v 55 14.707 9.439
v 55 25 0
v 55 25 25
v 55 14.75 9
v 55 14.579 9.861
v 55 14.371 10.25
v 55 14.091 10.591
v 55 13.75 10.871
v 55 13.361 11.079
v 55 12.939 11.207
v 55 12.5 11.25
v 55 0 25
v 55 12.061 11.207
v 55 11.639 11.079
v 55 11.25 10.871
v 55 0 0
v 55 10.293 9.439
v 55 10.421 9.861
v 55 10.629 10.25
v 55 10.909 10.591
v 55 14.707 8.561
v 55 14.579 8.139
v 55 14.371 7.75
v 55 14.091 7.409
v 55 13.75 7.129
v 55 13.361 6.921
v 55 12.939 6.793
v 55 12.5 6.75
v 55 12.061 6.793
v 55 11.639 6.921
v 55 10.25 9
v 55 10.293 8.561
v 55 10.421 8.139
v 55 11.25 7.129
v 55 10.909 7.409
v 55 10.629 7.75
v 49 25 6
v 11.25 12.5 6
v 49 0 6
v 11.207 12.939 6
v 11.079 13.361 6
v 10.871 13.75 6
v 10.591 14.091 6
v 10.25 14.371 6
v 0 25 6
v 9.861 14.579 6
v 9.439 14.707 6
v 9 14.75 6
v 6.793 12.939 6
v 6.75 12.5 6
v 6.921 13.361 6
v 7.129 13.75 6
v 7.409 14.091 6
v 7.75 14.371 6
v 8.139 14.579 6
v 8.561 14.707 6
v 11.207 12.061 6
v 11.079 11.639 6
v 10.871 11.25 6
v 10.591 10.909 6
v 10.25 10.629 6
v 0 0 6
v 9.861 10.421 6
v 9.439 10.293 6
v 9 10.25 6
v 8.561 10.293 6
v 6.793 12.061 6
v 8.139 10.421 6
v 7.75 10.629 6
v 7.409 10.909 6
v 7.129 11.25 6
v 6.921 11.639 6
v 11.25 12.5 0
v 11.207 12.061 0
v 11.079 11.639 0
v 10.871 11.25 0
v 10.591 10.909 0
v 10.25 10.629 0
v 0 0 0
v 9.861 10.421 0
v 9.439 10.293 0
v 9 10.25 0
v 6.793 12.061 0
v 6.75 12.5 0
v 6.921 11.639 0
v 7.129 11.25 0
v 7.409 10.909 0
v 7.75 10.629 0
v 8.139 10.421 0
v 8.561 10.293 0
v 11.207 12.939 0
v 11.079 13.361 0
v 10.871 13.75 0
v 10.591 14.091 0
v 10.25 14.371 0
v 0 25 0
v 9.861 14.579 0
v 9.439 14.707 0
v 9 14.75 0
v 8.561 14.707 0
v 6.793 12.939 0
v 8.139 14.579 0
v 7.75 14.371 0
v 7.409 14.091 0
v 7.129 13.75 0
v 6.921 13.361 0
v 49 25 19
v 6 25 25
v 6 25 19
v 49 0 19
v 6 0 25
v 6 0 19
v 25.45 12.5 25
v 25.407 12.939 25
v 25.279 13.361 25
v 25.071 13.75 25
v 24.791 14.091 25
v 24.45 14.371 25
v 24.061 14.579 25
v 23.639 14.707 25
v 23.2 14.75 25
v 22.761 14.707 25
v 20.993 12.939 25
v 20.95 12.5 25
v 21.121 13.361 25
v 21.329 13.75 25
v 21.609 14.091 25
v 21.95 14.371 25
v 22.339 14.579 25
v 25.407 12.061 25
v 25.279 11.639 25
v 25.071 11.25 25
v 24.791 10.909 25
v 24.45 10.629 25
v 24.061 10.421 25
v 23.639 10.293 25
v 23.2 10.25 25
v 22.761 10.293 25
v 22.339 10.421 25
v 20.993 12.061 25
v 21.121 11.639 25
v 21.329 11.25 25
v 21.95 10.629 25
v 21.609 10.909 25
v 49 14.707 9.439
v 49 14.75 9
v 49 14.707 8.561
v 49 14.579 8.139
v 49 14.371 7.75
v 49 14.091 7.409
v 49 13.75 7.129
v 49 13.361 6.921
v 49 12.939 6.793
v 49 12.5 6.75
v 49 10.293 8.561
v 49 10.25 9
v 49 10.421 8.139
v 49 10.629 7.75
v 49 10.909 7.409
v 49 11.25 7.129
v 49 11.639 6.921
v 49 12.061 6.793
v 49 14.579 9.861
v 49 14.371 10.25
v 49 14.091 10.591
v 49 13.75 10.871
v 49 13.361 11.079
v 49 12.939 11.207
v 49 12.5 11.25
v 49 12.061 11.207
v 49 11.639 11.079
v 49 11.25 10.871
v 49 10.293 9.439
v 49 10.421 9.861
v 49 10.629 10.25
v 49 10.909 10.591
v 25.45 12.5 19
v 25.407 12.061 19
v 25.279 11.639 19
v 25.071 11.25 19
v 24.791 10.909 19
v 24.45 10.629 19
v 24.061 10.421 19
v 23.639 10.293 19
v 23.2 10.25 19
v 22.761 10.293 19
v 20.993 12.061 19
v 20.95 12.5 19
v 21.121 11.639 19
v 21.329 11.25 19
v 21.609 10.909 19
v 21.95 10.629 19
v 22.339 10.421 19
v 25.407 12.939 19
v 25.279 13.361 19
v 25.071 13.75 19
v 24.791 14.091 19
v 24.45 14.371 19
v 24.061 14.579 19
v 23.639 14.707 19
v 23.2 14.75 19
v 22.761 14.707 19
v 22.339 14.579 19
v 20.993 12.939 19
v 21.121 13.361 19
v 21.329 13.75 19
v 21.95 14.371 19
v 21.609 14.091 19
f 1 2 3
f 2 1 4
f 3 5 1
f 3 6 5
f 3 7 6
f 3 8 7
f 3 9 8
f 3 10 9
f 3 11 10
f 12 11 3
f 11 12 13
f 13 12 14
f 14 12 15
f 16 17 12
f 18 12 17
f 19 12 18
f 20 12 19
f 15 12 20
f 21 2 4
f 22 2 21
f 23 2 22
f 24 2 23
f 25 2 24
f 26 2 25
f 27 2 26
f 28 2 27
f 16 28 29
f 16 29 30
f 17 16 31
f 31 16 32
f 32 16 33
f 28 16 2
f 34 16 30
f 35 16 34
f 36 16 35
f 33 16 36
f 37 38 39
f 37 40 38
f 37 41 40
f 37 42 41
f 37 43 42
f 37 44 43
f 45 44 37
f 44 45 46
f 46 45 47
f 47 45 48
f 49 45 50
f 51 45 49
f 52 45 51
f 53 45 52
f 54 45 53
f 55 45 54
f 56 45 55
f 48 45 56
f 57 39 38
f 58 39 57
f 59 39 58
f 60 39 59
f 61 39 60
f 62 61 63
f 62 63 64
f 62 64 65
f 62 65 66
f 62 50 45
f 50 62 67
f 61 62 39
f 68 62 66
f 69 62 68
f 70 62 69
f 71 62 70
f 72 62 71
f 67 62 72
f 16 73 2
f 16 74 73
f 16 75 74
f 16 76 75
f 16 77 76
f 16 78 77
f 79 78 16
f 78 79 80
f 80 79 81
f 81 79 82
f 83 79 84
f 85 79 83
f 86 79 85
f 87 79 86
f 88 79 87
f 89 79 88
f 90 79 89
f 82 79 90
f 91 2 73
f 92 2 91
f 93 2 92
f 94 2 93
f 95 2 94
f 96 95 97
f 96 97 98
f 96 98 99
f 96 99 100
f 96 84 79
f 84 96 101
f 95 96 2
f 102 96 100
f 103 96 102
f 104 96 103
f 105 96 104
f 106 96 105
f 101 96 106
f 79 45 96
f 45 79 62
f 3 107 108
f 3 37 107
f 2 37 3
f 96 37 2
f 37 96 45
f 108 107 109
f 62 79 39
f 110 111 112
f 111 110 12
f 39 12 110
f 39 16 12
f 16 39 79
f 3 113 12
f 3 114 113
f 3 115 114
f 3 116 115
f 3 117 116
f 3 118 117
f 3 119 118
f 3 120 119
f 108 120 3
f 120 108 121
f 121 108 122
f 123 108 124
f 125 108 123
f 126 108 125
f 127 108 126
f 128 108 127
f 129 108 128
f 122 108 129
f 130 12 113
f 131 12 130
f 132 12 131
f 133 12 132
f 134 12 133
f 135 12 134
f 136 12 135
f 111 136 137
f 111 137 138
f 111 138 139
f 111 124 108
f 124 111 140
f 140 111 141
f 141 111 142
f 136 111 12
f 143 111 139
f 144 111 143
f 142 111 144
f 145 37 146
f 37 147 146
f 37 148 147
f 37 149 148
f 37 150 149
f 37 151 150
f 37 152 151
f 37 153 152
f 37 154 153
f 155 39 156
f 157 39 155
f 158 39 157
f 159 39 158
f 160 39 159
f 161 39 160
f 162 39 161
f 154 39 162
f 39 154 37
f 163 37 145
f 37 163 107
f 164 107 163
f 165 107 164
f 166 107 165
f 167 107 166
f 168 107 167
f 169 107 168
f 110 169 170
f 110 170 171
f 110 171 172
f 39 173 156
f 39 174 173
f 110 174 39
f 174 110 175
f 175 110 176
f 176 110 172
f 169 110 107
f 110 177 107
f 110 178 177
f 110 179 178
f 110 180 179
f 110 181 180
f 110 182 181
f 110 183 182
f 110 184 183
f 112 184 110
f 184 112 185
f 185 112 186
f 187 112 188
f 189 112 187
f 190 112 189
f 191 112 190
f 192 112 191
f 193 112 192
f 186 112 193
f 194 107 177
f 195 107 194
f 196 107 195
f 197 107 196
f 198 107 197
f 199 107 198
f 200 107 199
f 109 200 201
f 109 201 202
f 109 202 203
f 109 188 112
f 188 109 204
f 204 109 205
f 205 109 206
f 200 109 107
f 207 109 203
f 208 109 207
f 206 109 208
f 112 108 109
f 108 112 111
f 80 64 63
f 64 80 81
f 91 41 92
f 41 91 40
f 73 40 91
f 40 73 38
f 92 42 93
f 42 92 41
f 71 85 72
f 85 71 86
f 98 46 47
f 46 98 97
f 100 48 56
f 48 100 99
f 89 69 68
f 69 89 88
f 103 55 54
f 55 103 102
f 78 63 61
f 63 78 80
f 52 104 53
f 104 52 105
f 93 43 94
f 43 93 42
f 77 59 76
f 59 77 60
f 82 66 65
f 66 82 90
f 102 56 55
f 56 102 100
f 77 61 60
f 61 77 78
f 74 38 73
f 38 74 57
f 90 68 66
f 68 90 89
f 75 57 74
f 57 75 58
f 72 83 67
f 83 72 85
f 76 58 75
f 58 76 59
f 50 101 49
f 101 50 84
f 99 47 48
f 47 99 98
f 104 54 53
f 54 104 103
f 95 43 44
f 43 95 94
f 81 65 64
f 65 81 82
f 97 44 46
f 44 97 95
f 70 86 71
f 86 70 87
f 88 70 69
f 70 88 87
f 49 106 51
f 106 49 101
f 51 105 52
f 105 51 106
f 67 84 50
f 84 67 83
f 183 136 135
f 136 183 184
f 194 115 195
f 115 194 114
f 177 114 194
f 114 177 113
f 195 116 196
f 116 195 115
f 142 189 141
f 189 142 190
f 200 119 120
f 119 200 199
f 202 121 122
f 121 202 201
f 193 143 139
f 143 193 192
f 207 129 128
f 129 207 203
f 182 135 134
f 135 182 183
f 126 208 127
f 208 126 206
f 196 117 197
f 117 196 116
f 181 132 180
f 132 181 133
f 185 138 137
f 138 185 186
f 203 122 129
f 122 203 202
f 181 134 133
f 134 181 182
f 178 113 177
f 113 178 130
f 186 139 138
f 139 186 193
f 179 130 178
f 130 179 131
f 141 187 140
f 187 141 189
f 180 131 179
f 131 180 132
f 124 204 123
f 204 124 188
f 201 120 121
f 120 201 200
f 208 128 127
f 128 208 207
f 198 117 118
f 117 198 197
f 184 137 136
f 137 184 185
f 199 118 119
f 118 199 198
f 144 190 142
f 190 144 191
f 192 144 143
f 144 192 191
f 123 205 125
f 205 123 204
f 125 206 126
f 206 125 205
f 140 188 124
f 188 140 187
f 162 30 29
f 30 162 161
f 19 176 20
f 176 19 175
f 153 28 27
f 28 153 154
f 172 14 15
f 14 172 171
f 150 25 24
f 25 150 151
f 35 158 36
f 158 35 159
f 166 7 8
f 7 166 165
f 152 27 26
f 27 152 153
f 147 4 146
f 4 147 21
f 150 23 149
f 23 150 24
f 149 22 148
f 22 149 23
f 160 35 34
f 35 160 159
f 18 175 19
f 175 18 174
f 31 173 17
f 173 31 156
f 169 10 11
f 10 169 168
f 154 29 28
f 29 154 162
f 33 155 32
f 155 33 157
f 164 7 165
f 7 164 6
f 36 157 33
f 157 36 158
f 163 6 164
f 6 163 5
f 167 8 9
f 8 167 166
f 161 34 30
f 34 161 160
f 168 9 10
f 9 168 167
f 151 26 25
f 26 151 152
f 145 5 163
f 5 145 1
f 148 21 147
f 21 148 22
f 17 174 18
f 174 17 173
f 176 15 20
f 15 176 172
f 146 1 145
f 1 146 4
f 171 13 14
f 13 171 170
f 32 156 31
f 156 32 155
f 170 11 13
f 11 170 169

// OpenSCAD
$fn = 32;

// ----------------------------------------------------------------------
// Z-bracket: 55 x 25 x 25 mm
// ----------------------------------------------------------------------

// --- parameters (mm) ---
lower_len = 55;           // lower foot length, X
upper_len = 43;           // upper foot length, X
width = 25;               // bracket width, Y
rise = 25;                // overall rise, Z
thick = 6;                // plate thickness
hole_d = 4.5;             // clearance for M4

module hole_z(px, py, z0) {
  translate([px, py, z0 - 0.5]) cylinder(h = thick + 1, d = hole_d);
}
module hole_x(py, pz) {
  translate([-0.5, py, pz]) rotate([0, 90, 0]) cylinder(h = thick + 1, d = hole_d);
}

difference() {
  union() {
    cube([lower_len, width, thick]);
    /* web, overlapping the lower foot */
    translate([lower_len - thick, 0, 0]) cube([thick, width, rise]);
    /* upper foot, sunk into the web */
    translate([lower_len - thick - upper_len, 0, rise - thick]) cube([upper_len + thick, width, thick]);
  }
  hole_z(9, 12.5, 0);
  translate([lower_len - thick - 25.8, 0, 0]) hole_z(0, 12.5, rise - thick);
  translate([lower_len - thick, 0, 0]) hole_x(12.5, 9);
}
